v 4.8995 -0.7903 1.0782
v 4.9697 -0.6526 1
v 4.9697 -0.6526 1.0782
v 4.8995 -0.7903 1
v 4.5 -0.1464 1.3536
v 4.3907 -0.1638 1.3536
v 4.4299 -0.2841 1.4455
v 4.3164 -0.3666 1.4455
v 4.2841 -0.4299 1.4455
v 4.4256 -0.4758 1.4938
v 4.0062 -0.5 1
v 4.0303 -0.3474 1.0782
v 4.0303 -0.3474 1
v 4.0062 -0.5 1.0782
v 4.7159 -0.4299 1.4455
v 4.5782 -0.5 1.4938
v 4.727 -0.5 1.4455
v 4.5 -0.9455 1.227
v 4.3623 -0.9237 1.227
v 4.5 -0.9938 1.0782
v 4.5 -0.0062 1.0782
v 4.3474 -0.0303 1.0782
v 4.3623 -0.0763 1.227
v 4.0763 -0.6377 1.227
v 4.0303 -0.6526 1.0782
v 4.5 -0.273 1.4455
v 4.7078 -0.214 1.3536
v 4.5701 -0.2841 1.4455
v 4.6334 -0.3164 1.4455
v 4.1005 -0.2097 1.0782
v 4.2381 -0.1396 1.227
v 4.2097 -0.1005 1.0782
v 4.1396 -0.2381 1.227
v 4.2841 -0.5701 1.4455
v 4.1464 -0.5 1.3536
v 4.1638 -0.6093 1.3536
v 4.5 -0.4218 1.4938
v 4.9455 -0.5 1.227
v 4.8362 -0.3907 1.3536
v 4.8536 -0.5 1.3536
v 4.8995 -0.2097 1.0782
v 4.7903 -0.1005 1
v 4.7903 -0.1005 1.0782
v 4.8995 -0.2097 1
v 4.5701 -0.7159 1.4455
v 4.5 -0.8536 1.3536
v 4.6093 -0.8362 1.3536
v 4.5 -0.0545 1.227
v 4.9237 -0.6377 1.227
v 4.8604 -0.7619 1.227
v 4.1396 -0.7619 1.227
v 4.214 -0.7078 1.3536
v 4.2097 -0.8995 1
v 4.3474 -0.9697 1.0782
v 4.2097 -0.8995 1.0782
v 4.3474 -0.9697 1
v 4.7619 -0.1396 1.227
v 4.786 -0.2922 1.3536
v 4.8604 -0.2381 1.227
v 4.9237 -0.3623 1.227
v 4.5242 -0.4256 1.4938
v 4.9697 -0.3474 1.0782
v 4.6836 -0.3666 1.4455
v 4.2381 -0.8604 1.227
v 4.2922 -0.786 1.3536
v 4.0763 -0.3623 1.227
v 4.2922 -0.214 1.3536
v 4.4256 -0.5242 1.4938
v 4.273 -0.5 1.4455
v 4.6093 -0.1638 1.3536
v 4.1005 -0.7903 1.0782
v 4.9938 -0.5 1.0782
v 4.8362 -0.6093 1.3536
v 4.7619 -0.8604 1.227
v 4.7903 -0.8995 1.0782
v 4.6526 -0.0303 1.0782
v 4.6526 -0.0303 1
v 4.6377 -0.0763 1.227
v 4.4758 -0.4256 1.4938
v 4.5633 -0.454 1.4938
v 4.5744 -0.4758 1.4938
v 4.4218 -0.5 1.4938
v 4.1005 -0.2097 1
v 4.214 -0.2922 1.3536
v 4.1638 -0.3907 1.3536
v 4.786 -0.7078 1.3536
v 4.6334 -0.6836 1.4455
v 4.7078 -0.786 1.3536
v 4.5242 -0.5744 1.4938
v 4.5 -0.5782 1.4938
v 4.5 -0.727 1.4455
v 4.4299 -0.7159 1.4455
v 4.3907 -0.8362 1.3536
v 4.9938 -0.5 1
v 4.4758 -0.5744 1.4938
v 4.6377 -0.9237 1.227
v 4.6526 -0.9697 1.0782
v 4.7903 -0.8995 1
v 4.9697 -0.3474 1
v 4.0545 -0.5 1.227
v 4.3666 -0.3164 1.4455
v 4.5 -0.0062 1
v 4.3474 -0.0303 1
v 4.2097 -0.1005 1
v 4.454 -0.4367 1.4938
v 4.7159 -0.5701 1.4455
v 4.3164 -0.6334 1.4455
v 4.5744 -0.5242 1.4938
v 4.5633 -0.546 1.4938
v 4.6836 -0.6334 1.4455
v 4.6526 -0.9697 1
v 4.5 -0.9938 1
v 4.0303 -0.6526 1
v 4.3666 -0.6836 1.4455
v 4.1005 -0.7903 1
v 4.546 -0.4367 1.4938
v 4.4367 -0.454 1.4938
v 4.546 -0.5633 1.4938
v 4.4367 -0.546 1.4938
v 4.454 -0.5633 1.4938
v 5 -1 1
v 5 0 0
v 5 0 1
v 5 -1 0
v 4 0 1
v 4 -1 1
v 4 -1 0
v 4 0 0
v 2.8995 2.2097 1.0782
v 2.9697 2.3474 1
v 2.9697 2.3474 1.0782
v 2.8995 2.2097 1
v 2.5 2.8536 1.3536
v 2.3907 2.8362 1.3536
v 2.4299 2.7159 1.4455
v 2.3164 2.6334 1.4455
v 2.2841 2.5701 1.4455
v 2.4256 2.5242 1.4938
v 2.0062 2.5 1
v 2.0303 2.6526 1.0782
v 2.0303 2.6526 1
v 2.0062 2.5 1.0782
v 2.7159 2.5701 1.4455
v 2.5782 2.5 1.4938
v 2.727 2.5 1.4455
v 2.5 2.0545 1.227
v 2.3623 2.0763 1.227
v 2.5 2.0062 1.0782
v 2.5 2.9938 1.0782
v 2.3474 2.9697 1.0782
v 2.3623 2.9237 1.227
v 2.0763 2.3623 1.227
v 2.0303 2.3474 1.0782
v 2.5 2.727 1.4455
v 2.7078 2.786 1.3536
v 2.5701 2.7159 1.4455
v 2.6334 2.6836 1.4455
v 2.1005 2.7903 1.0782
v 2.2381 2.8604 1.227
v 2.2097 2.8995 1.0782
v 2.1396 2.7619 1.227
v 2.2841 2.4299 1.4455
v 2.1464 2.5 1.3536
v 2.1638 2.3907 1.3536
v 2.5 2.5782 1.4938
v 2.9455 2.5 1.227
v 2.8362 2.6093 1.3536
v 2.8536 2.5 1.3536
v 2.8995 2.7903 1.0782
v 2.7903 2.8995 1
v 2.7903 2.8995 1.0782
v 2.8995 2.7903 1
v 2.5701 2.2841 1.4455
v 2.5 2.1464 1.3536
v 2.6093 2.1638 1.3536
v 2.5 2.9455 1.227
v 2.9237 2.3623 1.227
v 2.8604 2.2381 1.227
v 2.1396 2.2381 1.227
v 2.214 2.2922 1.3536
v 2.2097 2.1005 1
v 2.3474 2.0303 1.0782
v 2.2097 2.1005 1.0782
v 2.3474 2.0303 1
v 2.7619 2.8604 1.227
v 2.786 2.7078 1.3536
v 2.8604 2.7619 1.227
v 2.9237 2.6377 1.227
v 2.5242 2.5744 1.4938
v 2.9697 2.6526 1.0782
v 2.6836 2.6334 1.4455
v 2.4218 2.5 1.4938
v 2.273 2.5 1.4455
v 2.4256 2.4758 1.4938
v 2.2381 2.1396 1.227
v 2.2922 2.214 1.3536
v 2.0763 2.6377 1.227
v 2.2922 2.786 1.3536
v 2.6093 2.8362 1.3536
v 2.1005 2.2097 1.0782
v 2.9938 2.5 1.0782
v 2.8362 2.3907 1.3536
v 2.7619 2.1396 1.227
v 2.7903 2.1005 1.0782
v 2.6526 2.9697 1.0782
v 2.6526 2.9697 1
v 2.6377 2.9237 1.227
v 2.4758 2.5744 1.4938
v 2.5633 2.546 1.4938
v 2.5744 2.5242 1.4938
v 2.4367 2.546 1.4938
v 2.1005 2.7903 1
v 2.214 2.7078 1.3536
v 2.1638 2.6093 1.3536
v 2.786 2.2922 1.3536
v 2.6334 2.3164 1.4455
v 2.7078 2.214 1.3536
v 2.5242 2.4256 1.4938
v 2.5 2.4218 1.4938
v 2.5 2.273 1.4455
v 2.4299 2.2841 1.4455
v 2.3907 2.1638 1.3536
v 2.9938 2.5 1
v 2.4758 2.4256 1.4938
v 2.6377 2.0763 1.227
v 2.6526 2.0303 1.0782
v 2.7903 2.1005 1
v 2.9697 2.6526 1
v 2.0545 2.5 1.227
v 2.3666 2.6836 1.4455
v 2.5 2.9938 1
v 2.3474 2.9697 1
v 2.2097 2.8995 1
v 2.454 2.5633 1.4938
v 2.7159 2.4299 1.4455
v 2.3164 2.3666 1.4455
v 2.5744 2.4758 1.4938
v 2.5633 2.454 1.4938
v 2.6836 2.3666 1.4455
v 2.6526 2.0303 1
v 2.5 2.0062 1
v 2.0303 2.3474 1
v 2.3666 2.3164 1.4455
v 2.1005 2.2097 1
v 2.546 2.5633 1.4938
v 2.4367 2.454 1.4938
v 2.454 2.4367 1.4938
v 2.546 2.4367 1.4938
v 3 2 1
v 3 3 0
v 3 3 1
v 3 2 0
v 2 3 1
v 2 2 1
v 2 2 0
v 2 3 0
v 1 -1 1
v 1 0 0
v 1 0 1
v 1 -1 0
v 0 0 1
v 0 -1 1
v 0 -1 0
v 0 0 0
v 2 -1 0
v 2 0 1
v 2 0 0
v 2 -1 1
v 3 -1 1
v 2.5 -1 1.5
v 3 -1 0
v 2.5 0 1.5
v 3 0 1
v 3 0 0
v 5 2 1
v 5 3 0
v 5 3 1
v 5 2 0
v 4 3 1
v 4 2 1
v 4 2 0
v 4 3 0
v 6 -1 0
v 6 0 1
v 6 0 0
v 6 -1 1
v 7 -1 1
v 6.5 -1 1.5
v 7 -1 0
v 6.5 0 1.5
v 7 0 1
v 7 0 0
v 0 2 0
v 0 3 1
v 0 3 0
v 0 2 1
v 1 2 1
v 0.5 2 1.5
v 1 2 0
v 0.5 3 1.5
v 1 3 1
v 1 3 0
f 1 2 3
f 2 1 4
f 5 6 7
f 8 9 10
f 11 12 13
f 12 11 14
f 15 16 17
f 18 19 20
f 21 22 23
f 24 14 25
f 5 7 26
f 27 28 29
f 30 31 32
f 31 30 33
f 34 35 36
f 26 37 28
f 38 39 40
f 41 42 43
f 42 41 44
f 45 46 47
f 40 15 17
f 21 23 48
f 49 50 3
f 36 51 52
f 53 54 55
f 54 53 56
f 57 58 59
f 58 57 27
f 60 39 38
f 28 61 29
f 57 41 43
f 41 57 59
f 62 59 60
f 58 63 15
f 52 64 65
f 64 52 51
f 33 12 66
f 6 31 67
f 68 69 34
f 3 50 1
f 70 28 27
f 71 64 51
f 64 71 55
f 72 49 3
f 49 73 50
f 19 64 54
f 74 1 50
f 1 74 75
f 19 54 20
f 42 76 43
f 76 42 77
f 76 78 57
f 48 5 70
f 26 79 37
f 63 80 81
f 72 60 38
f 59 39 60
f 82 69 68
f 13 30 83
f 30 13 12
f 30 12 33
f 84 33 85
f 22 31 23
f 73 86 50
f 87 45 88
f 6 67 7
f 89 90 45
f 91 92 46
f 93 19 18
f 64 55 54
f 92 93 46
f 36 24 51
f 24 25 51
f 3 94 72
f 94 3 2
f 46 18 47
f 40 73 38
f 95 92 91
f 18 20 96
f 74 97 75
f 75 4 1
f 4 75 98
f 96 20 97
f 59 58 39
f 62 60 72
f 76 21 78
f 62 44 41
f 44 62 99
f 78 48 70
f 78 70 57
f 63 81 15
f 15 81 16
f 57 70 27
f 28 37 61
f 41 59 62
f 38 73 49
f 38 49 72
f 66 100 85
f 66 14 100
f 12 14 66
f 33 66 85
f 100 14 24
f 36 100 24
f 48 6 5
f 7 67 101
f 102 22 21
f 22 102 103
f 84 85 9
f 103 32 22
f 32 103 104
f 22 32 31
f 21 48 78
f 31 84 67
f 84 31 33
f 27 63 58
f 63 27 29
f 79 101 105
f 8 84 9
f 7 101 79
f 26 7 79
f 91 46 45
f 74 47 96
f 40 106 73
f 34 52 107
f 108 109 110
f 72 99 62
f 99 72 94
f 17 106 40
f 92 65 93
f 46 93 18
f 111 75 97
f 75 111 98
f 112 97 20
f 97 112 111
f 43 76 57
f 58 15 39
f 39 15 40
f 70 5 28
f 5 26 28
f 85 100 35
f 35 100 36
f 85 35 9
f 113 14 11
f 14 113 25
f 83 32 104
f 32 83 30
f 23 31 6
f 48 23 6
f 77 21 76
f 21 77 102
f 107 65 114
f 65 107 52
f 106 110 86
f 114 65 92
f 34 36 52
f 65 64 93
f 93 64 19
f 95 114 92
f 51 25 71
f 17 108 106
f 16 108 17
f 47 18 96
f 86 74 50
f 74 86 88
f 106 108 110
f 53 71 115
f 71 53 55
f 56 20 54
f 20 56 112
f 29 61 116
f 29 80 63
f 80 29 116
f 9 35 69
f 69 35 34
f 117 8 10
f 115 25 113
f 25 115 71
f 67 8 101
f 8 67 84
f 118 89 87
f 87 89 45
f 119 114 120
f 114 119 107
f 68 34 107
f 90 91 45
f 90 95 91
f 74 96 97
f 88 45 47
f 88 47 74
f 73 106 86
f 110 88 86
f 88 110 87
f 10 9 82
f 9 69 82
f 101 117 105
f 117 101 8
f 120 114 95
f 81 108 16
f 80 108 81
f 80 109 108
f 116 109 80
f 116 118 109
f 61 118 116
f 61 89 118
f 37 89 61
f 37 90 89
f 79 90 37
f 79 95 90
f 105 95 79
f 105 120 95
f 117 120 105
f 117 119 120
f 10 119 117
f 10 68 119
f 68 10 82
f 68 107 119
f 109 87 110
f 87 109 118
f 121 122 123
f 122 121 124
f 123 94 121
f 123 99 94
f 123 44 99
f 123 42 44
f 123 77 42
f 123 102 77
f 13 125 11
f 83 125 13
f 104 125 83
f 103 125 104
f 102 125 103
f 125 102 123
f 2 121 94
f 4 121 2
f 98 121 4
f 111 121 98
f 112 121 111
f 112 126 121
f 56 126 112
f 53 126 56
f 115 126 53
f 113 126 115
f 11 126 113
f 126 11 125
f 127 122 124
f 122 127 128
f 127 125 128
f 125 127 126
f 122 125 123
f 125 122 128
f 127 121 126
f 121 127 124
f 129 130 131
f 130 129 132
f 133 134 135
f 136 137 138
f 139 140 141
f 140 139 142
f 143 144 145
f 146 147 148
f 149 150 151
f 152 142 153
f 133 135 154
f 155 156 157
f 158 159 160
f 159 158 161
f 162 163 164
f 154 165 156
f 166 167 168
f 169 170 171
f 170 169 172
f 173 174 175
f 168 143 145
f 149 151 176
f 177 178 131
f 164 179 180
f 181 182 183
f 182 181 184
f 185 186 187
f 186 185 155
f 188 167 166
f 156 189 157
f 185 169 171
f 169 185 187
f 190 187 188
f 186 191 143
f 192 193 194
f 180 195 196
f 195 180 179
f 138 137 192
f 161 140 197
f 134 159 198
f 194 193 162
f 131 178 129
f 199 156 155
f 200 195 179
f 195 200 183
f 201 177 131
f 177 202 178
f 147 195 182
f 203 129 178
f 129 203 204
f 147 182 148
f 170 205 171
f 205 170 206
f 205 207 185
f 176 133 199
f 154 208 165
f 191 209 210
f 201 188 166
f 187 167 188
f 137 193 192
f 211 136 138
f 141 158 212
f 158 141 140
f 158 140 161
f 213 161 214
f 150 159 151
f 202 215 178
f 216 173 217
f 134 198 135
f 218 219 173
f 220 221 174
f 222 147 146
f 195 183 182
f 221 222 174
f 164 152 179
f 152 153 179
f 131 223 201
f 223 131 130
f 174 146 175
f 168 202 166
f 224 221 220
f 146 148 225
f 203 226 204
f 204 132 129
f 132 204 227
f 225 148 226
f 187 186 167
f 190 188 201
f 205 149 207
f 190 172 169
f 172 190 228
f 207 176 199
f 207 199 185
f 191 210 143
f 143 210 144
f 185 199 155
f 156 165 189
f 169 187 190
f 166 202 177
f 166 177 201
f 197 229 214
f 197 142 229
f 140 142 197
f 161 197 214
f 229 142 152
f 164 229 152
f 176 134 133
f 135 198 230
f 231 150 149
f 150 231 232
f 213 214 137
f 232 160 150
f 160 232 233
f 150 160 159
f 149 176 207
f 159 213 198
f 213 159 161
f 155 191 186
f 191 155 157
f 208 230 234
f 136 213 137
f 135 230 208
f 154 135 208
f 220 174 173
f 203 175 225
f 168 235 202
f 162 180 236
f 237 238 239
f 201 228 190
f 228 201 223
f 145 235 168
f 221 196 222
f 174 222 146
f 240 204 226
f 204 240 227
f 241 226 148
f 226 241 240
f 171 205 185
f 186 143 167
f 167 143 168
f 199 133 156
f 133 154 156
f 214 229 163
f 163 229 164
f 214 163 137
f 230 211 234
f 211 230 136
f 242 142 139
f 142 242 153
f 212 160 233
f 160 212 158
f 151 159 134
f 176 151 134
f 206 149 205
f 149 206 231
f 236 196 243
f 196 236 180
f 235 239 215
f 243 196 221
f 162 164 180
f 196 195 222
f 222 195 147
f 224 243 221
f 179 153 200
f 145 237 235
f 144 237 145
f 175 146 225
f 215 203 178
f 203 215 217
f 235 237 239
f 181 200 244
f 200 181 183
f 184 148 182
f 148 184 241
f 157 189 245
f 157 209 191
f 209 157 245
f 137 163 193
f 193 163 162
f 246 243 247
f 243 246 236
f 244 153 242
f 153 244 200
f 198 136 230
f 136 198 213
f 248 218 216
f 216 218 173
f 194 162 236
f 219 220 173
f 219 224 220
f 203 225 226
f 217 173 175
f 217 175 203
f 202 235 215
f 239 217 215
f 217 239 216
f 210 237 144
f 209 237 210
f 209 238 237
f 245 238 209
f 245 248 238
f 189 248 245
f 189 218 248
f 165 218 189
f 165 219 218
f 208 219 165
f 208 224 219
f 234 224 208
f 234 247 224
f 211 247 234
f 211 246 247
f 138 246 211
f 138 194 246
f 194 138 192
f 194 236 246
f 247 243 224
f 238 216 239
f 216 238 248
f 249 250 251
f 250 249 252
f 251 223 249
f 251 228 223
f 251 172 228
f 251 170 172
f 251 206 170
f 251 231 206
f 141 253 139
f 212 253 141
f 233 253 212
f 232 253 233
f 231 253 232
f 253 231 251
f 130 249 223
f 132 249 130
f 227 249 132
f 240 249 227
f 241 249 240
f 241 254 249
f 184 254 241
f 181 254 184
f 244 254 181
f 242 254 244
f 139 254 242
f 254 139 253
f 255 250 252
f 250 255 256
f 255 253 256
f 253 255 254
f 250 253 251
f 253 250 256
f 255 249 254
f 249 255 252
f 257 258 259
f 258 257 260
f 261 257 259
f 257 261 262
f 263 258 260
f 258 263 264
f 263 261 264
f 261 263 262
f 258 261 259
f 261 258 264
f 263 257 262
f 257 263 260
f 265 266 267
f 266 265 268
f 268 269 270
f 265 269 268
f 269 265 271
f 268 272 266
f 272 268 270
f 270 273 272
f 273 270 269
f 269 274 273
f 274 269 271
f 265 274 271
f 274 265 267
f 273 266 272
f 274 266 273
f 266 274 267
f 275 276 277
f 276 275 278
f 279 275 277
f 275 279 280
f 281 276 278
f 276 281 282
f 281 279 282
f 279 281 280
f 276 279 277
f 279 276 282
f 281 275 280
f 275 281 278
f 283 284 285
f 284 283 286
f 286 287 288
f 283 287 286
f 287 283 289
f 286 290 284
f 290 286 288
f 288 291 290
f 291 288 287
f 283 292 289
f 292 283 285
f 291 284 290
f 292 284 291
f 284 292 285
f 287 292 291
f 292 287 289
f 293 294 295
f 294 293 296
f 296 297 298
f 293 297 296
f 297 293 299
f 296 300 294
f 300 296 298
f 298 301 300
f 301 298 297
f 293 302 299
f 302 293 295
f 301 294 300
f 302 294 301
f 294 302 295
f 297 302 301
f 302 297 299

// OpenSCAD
module house(roof="flat", cor="red") {
   if(roof=="flat") {
       translate([0,-1,0]){
           color(cor){
            cube();
           }
       }
   }else if(roof=="pitched") {
        rotate([90,0,0]){
            color(cor){
                linear_extrude(height=1){                
                    polygon(points=[[0,0],[0,1],[0.5,1.5],[1,1],[1,0]]);
                }
            }
        }
    }else if(roof=="domical") {
        translate([0,-1,0]){
            translate([0.5,0.5,1]){
                color(cor){
                    sphere(r=0.5,$fn=20); 
                }
            }
            color(cor){
                cube();
            }
        }
    }
}

house();
translate([2,0,0]){
    house("pitched");
}
translate([4,3,0]){
    house(cor="blue");
}
translate([4,0,0]){
    house("domical","green");
}
translate([6,0,0]){
    house(roof="pitched", cor=[.7,0.5,0.3]);
}
translate([0,3,0]){
    house(cor=[1,0,1], roof="pitched");
}
translate([2,3,0]){
    house(roof="domical", cor="white");
}
